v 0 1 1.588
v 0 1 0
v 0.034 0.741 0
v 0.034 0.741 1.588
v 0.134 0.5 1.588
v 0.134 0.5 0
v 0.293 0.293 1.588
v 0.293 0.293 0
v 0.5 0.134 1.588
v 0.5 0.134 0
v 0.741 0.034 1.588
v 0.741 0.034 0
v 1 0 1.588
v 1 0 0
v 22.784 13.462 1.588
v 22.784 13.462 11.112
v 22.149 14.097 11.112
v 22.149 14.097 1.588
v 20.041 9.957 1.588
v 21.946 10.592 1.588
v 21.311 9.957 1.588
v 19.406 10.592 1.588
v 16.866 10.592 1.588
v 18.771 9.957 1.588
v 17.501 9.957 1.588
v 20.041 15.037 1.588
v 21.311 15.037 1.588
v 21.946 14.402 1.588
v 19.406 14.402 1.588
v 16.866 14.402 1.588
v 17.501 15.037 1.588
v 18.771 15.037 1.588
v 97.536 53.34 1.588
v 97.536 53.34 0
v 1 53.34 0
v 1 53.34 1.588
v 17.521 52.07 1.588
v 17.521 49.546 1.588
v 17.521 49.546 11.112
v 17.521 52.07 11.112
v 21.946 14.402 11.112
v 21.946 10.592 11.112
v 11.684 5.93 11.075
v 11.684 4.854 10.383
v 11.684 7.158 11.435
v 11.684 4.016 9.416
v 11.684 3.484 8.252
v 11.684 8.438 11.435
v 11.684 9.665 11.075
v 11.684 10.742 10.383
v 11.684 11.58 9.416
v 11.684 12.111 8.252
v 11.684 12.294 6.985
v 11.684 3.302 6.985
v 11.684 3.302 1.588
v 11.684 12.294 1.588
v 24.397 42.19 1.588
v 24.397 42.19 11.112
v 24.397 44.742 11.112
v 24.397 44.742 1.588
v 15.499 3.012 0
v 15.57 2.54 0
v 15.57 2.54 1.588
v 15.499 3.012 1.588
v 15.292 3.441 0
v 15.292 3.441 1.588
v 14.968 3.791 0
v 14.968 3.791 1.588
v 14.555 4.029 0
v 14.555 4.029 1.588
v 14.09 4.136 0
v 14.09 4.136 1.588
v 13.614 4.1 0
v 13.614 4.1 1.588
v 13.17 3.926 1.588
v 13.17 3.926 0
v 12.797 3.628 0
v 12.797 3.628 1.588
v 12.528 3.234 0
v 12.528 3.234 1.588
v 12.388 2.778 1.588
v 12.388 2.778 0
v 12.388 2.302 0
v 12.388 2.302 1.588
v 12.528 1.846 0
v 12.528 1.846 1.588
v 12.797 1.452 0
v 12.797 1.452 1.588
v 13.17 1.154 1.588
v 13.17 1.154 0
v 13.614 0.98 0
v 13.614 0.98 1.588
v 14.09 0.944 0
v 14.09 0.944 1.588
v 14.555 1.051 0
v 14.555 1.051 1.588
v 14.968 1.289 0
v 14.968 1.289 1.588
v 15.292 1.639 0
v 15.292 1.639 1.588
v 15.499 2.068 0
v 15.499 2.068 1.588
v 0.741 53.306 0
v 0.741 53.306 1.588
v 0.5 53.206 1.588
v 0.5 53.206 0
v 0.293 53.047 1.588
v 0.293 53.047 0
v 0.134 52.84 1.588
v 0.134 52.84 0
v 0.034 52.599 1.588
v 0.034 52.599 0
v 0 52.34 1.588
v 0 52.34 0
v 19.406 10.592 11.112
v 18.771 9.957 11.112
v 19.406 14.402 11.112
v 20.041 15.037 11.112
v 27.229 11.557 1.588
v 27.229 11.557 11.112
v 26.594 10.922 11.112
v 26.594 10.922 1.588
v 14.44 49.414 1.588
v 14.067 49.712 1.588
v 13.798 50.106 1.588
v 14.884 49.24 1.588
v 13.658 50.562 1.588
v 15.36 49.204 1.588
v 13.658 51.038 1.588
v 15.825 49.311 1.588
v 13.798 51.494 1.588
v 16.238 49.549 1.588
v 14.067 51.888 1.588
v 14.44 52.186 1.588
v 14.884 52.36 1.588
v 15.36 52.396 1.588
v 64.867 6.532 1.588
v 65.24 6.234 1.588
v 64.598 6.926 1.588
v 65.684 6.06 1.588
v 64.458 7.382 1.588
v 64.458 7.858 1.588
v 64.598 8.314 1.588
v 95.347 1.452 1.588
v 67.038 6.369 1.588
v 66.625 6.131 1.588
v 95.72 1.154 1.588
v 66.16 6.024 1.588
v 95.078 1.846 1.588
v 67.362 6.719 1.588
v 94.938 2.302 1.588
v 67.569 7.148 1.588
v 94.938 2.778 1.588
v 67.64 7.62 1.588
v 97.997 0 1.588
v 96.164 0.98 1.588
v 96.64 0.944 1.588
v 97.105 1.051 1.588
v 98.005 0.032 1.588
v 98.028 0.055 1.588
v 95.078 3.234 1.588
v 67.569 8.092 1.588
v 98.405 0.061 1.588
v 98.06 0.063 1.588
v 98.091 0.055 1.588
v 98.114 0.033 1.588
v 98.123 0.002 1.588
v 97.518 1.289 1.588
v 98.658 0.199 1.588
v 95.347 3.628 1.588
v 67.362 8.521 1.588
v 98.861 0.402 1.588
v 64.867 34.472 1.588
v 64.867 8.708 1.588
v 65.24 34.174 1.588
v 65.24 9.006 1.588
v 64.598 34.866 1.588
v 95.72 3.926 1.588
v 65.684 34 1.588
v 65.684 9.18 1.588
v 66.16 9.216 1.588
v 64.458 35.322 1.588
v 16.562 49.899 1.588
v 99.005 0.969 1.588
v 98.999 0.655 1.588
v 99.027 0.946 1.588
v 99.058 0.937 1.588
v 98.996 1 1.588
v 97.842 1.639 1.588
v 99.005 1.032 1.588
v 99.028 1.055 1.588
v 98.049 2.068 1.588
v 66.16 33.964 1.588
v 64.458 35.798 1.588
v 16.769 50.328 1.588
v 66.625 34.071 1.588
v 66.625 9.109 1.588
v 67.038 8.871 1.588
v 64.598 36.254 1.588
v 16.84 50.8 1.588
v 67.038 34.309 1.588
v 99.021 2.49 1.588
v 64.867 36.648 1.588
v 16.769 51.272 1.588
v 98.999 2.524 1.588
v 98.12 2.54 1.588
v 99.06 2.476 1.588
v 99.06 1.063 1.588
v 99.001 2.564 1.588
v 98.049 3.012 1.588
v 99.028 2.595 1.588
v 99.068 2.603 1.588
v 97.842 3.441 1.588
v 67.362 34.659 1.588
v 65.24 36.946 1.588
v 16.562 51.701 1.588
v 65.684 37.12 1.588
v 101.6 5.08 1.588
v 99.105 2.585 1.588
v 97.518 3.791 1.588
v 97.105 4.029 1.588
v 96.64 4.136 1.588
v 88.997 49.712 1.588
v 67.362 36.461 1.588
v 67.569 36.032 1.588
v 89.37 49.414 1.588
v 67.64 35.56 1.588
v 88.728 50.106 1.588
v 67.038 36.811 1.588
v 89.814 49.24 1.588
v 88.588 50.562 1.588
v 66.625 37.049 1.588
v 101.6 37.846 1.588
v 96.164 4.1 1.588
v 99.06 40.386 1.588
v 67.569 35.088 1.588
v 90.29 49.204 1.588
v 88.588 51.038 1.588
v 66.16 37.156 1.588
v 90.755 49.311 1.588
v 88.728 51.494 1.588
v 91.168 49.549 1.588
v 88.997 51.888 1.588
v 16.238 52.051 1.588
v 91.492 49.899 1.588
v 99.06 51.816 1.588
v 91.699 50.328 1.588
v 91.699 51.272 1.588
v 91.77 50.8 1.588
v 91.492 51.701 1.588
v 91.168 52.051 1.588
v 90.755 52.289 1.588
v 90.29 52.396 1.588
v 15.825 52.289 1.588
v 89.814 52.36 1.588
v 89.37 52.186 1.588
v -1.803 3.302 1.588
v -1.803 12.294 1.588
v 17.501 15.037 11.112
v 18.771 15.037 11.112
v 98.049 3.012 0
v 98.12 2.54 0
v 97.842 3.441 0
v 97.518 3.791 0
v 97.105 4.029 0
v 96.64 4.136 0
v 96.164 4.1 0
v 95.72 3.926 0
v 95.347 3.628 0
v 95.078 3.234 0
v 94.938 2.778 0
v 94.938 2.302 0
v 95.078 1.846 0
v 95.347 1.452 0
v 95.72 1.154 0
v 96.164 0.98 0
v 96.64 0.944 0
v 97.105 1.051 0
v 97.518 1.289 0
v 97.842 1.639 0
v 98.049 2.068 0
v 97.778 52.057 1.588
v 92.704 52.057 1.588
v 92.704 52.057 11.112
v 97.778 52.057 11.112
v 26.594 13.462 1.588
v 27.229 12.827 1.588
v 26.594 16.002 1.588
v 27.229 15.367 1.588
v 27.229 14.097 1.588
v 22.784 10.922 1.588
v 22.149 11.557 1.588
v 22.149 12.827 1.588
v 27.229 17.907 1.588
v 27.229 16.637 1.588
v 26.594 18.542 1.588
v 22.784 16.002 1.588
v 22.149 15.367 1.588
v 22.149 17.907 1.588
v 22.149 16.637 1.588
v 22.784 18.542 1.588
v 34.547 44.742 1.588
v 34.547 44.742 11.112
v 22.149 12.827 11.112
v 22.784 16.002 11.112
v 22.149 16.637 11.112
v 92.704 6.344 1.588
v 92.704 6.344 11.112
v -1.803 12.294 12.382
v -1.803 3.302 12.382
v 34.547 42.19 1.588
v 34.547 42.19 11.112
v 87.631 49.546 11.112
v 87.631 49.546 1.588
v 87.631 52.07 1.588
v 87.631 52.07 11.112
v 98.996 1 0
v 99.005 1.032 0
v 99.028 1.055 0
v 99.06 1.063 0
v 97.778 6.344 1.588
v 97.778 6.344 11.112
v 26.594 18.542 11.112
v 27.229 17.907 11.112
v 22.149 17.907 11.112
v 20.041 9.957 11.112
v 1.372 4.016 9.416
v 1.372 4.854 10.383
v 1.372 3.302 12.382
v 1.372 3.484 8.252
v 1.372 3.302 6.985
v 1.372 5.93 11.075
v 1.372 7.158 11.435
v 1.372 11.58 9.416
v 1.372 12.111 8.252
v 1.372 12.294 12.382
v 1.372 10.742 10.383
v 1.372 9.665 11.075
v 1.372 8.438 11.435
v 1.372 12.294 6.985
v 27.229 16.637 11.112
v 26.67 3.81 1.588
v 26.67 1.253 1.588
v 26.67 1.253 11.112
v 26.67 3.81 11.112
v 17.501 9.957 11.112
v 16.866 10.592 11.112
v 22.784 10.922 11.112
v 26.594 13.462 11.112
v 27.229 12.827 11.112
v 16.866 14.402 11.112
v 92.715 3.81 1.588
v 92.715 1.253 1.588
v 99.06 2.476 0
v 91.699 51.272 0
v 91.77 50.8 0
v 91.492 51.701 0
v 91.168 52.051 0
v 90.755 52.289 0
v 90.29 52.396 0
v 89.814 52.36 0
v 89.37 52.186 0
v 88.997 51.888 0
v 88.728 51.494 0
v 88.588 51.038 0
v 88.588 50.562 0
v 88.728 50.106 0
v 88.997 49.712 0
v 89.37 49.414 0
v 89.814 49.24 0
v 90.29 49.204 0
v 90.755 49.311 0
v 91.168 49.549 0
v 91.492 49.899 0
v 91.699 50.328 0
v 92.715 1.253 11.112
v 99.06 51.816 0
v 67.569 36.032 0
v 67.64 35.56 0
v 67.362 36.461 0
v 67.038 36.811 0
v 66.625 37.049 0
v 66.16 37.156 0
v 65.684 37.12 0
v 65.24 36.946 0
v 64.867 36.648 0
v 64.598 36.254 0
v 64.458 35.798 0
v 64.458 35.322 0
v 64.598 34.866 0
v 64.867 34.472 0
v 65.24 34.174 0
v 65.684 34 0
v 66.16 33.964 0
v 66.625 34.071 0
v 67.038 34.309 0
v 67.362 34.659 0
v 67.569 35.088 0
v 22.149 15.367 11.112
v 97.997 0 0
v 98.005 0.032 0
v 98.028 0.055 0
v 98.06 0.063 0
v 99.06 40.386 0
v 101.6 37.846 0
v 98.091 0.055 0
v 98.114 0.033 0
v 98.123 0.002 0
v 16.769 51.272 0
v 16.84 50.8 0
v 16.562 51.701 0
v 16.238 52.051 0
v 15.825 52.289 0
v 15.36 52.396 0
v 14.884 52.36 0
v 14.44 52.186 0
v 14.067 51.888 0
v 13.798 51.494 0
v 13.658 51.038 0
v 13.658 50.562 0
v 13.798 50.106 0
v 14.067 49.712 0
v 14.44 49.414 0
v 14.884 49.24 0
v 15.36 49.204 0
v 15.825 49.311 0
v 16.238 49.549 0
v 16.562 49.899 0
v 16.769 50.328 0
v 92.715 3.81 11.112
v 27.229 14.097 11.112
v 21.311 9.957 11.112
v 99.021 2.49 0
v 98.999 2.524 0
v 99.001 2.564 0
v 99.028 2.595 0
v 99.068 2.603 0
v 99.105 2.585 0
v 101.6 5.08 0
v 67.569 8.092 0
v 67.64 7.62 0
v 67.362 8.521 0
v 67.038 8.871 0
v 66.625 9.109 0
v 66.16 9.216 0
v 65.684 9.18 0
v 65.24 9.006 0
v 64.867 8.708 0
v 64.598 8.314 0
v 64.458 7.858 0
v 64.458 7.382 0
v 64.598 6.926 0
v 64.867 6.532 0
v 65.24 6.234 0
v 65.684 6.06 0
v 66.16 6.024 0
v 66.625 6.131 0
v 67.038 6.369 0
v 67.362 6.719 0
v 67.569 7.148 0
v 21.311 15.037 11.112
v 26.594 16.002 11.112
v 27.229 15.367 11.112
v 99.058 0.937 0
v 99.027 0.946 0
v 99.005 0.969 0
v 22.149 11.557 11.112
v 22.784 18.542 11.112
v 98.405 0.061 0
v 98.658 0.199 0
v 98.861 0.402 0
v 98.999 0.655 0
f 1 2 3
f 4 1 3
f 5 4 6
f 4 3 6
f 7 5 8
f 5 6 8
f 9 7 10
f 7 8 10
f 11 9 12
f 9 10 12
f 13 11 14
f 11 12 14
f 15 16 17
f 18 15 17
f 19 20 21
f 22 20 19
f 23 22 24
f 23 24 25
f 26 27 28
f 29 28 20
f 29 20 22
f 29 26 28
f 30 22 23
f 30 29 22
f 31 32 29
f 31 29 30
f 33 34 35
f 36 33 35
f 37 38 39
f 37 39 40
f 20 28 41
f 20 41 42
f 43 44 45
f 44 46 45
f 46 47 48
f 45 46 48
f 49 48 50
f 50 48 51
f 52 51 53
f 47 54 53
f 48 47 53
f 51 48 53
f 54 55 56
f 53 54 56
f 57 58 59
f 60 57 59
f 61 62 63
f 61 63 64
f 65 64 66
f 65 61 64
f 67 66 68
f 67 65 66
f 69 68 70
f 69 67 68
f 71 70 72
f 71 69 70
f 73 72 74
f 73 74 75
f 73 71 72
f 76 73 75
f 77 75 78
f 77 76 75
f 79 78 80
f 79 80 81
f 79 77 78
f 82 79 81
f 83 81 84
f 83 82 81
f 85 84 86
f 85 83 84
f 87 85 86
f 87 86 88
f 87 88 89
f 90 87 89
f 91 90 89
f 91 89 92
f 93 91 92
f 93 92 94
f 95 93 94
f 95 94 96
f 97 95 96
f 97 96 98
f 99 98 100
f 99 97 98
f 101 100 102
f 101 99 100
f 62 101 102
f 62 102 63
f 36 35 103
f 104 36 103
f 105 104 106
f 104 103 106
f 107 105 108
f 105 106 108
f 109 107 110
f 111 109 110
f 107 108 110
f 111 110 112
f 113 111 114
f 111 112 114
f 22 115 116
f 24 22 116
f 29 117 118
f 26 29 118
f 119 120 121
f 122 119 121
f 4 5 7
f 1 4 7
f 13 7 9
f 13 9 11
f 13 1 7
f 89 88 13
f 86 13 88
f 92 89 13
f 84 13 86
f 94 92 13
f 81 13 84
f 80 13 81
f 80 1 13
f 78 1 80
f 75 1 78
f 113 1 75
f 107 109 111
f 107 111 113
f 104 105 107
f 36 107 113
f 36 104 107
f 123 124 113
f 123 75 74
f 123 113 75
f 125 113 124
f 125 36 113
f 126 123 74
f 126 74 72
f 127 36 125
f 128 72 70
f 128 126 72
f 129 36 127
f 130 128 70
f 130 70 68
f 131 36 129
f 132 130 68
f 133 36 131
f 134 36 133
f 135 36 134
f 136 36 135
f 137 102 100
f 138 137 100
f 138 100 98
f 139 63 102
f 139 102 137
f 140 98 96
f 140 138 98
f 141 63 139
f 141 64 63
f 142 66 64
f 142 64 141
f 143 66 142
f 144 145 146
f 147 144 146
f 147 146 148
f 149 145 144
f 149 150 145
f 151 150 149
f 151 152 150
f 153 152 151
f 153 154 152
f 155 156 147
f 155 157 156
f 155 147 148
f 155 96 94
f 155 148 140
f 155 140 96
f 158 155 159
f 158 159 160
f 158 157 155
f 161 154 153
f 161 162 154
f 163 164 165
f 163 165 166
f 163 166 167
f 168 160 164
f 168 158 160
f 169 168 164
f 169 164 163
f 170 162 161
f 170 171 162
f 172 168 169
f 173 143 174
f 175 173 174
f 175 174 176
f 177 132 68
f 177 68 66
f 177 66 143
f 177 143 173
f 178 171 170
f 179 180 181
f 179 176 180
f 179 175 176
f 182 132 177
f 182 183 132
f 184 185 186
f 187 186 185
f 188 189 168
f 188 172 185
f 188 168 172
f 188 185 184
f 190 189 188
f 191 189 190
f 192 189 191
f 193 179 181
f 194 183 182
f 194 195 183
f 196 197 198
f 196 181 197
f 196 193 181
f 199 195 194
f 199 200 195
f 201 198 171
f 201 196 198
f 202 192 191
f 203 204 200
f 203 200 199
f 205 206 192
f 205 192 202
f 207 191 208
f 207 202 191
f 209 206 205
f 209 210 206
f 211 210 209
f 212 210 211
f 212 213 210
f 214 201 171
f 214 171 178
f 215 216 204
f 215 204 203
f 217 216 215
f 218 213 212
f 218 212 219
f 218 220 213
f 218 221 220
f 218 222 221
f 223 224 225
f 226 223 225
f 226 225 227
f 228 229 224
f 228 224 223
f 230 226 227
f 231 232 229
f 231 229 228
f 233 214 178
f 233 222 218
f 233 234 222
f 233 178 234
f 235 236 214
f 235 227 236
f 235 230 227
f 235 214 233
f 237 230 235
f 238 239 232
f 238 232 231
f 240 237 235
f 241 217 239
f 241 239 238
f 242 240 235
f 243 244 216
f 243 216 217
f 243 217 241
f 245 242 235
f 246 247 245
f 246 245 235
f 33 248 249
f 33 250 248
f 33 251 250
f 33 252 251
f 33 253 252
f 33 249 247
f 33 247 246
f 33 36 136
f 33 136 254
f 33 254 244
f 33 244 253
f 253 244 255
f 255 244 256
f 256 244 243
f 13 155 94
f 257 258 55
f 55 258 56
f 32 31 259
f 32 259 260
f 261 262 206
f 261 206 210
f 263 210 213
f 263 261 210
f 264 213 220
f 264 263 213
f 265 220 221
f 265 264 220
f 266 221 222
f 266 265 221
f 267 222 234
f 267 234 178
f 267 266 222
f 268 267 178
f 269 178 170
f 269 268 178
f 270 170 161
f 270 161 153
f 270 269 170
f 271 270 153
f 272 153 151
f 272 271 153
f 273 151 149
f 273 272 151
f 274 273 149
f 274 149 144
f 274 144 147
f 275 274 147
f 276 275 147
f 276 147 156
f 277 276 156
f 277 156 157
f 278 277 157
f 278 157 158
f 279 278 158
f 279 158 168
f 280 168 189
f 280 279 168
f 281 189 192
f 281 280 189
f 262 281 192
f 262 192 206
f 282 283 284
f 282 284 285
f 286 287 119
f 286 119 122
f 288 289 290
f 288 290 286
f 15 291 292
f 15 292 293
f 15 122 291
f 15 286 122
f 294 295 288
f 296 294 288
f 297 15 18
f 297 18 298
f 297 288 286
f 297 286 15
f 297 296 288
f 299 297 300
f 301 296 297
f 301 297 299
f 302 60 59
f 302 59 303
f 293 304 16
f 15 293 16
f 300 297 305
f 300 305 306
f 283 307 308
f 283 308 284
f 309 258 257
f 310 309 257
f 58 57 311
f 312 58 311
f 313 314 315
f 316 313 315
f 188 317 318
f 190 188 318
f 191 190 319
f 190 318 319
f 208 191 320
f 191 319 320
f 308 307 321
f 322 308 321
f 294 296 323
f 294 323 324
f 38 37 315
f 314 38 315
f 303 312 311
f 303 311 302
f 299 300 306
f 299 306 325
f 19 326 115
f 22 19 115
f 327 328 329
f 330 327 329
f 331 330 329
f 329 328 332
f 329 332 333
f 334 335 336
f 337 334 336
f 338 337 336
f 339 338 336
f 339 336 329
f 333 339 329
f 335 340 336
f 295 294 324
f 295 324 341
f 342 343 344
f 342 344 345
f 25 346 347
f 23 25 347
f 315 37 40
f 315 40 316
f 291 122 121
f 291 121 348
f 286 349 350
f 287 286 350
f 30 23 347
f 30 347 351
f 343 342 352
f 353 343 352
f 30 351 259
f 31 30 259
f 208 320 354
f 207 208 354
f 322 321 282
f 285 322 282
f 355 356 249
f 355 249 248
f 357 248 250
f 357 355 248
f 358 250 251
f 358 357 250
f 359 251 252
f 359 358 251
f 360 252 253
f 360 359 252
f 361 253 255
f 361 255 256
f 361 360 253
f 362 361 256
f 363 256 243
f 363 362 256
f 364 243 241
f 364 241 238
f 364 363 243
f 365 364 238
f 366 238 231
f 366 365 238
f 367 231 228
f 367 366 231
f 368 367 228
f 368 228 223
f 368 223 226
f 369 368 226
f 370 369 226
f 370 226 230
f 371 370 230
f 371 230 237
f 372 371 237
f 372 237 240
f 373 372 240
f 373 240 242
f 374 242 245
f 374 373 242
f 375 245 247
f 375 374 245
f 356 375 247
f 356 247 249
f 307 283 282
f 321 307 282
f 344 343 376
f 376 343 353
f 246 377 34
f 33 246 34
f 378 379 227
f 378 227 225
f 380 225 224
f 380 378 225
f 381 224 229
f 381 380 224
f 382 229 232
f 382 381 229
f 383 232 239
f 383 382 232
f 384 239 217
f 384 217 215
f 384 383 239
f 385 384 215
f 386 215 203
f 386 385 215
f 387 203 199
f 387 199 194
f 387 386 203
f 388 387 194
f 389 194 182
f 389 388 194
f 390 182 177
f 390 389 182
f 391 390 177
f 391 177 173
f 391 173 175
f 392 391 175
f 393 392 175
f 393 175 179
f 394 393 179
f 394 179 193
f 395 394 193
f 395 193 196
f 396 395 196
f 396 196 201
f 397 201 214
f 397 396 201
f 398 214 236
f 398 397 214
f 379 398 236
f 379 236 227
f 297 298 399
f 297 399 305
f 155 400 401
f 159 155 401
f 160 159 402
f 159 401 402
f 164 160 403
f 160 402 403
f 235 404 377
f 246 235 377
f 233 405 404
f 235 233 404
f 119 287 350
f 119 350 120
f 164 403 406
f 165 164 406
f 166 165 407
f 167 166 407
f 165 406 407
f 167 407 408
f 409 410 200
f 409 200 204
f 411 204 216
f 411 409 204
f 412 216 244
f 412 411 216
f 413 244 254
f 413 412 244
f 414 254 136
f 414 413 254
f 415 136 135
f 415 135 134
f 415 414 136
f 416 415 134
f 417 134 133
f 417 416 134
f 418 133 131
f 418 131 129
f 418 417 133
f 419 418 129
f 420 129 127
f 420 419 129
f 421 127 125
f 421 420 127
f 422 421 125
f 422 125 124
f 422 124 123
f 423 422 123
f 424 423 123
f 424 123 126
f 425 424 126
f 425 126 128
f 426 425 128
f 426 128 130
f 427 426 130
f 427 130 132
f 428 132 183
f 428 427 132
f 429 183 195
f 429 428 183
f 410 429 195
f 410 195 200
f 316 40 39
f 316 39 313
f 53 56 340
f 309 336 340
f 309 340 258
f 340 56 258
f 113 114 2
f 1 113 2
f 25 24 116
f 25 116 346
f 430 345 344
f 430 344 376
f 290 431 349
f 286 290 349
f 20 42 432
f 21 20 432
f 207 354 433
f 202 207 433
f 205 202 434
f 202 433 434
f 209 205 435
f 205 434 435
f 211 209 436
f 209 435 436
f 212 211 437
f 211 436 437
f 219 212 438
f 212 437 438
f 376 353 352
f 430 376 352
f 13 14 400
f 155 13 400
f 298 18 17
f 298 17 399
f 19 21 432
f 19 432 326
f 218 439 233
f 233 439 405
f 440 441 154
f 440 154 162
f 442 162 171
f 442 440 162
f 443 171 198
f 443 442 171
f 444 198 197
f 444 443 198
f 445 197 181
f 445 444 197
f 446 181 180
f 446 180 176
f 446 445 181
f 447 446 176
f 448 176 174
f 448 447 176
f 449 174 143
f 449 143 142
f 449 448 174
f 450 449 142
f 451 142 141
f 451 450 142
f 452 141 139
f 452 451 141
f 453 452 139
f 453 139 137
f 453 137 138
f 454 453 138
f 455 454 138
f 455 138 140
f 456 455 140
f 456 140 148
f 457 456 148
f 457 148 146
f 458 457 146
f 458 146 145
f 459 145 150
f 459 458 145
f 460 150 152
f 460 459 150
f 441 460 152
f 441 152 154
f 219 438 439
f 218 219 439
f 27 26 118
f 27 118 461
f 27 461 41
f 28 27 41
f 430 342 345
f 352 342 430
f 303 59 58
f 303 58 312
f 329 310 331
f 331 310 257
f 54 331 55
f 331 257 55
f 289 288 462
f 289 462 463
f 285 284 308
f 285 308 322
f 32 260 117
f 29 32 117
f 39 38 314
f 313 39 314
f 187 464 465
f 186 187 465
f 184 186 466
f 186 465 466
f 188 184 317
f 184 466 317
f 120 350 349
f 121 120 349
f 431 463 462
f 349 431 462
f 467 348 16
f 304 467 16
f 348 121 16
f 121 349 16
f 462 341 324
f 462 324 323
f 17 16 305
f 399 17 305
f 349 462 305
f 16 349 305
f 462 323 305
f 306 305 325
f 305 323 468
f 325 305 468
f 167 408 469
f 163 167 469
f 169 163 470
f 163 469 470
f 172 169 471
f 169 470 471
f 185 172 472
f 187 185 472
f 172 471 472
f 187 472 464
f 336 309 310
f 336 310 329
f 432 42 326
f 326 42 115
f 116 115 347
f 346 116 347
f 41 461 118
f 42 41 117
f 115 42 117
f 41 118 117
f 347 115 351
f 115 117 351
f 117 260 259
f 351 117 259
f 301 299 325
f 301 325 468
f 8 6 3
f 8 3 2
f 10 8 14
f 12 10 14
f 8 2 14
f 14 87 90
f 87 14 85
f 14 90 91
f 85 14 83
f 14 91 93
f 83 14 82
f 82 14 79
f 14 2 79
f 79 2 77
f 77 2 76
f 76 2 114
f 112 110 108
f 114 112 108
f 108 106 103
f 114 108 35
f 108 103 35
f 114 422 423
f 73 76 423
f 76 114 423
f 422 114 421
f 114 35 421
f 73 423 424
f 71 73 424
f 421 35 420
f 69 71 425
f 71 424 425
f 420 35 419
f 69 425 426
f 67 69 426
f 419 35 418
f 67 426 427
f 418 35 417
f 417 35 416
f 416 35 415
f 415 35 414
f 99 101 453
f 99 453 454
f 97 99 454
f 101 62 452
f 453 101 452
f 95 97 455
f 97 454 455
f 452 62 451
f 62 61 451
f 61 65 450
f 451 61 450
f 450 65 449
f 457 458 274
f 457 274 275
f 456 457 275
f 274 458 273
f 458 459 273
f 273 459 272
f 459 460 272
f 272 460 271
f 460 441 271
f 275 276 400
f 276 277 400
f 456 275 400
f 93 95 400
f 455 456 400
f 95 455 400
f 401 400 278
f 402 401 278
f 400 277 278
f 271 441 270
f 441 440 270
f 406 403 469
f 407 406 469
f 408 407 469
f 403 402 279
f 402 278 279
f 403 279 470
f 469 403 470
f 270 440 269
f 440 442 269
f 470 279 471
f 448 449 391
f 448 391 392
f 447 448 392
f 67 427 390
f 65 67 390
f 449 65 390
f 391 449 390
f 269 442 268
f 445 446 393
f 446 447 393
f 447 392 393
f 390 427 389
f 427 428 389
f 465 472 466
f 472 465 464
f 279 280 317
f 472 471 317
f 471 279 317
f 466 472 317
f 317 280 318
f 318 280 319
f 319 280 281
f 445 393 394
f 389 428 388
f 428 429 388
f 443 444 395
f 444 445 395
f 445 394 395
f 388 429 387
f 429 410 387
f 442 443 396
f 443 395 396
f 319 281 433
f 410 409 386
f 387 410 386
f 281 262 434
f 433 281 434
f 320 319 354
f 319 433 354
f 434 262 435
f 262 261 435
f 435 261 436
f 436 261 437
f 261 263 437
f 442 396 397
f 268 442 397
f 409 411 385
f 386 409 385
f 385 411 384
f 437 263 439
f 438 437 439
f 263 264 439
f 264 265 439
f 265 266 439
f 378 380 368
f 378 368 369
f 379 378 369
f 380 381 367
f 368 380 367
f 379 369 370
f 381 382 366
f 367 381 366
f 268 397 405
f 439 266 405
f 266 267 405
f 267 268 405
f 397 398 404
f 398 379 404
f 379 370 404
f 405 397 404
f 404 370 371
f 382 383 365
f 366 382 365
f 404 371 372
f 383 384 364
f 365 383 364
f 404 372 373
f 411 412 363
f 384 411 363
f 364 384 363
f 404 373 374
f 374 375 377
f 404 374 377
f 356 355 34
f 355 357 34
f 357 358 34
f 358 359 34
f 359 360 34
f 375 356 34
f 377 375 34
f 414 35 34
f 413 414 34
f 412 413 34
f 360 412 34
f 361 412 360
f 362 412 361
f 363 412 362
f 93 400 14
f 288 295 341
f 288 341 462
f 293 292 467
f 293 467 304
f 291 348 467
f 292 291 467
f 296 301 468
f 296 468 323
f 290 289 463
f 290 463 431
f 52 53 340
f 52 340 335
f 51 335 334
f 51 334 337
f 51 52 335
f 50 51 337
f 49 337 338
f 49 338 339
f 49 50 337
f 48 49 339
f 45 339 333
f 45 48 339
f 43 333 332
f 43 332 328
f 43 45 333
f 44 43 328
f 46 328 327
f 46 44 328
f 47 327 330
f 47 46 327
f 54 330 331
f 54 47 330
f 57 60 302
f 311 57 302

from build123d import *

# Parameters (mm, degrees)
SKETCH_20_R           = 1.5999968
BOSS_EXTRUDE1_DEPTH   = 1.5875
BOSS_EXTRUDE3_START   = 1.5875
SKETCH_21_W           = 5.073903667
SKETCH_21_H           = 45.712510943
BOSS_EXTRUDE3_DEPTH   = 9.525
BOSS_EXTRUDE3_2_DEPTH = 9.525
BOSS_EXTRUDE3_3_DEPTH = 9.525
SKETCH_21_W_2         = 10.150310815
SKETCH_21_H_2         = 2.551495436
BOSS_EXTRUDE3_4_DEPTH = 9.525
SKETCH_21_W_3         = 70.109338124
SKETCH_21_H_3         = 2.523533961
BOSS_EXTRUDE3_5_DEPTH = 9.525
SKETCH_21_W_4         = 66.044705072
SKETCH_21_H_4         = 2.556578821
BOSS_EXTRUDE3_6_DEPTH = 9.525
BOSS_EXTRUDE6_START   = 1.5875
BOSS_EXTRUDE6_DEPTH   = 10.795
CUT_EXTRUDE4_DEPTH    = 10.3124


with BuildPart() as part:
    # 20 → Boss-Extrude1 (new body)
    with BuildSketch(Plane.XY):
        with BuildLine():
            Line((99.06, 51.816), (97.536, 53.34))
            Line((97.536, 53.34), (0.999998, 53.34))
            ThreePointArc((0.999998, 53.34), (0.292892414, 53.047107586), (0, 52.340002))
            Line((0, 52.340002), (0, 0.999998))
            ThreePointArc((0, 0.999998), (0.292892414, 0.292892414), (0.999998, 0))
            Line((0.999998, 0), (97.996502, 0))
            ThreePointArc((97.996502, 0), (98.015100719, 0.044901281), (98.060002, 0.0635))
            ThreePointArc((98.060002, 0.0635), (98.104184738, 0.045608504), (98.123469987, 0.002016083))
            ThreePointArc((98.123469987, 0.002016083), (98.767107586, 0.292892414), (99.057983917, 0.936530013))
            ThreePointArc((99.057983917, 0.936530013), (99.014391496, 0.955815262), (98.9965, 0.999998))
            ThreePointArc((98.9965, 0.999998), (99.015098719, 1.044899281), (99.06, 1.063498))
            Line((99.06, 1.063498), (99.06, 2.476491629))
            ThreePointArc((99.06, 2.476491629), (99.001325916, 2.564303602), (99.1049072, 2.5849072))
            Line((99.1049072, 2.5849072), (101.555098719, 5.035098719))
            Line((101.555098719, 5.035098719), (101.6, 5.08))
            Line((101.6, 5.08), (101.6, 5.1435))
            Line((101.6, 5.1435), (101.6, 37.846))
            Line((101.6, 37.846), (99.06, 40.386))
            Line((99.06, 40.386), (99.06, 51.816))
        make_face()
        with Locations((13.97, 2.54)):
            Circle(SKETCH_20_R, mode=Mode.SUBTRACT)
        with Locations((66.04, 7.62)):
            Circle(SKETCH_20_R, mode=Mode.SUBTRACT)
        with Locations((96.52, 2.54)):
            Circle(SKETCH_20_R, mode=Mode.SUBTRACT)
        with Locations((15.24, 50.8)):
            Circle(SKETCH_20_R, mode=Mode.SUBTRACT)
        with Locations((66.04, 35.56)):
            Circle(SKETCH_20_R, mode=Mode.SUBTRACT)
        with Locations((90.17, 50.8)):
            Circle(SKETCH_20_R, mode=Mode.SUBTRACT)
    extrude(amount=BOSS_EXTRUDE1_DEPTH)


with BuildPart() as body_2:
    # 21 → Boss-Extrude3 (new body)
    with BuildSketch(Plane.XY.offset(BOSS_EXTRUDE3_START)):
        with Locations((95.241145717, 29.200449355)):
            Rectangle(SKETCH_21_W, SKETCH_21_H)
    extrude(amount=BOSS_EXTRUDE3_DEPTH)


with BuildPart() as body_3:
    # 21 → Boss-Extrude3 2 (new body)
    with BuildSketch(Plane.XY.offset(BOSS_EXTRUDE3_START)):
        Polygon((22.7838, 10.922), (22.1488, 11.557), (22.1488, 12.827), (22.7838, 13.462), (22.1488, 14.097), (22.1488, 15.367), (22.7838, 16.002), (22.1488, 16.637), (22.1488, 17.907), (22.7838, 18.542), (26.5938, 18.542), (27.2288, 17.907), (27.2288, 16.637), (26.5938, 16.002), (27.2288, 15.367), (27.2288, 14.097), (26.5938, 13.462), (27.2288, 12.827), (27.2288, 11.557), (26.5938, 10.922), align=None)
    extrude(amount=BOSS_EXTRUDE3_2_DEPTH)


with BuildPart() as body_4:
    # 21 → Boss-Extrude3 3 (new body)
    with BuildSketch(Plane.XY.offset(BOSS_EXTRUDE3_START)):
        Polygon((20.0406, 9.9568), (19.4056, 10.5918), (18.7706, 9.9568), (17.5006, 9.9568), (16.8656, 10.5918), (16.8656, 14.4018), (17.5006, 15.0368), (18.7706, 15.0368), (19.4056, 14.4018), (20.0406, 15.0368), (21.3106, 15.0368), (21.9456, 14.4018), (21.9456, 10.5918), (21.3106, 9.9568), align=None)
    extrude(amount=BOSS_EXTRUDE3_3_DEPTH)


with BuildPart() as body_5:
    # 21 → Boss-Extrude3 4 (new body)
    with BuildSketch(Plane.XY.offset(BOSS_EXTRUDE3_START)):
        with Locations((29.472154972, 43.466052718)):
            Rectangle(SKETCH_21_W_2, SKETCH_21_H_2)
    extrude(amount=BOSS_EXTRUDE3_4_DEPTH)


with BuildPart() as body_6:
    # 21 → Boss-Extrude3 5 (new body)
    with BuildSketch(Plane.XY.offset(BOSS_EXTRUDE3_START)):
        with Locations((52.575938469, 50.80823302)):
            Rectangle(SKETCH_21_W_3, SKETCH_21_H_3)
    extrude(amount=BOSS_EXTRUDE3_5_DEPTH)


with BuildPart() as body_7:
    # 21 → Boss-Extrude3 6 (new body)
    with BuildSketch(Plane.XY.offset(BOSS_EXTRUDE3_START)):
        with Locations((59.692352536, 2.53171059)):
            Rectangle(SKETCH_21_W_4, SKETCH_21_H_4)
    extrude(amount=BOSS_EXTRUDE3_6_DEPTH)


with BuildPart() as body_8:
    # 21<6> → Boss-Extrude6 (new body)
    with BuildSketch(Plane.XY.offset(BOSS_EXTRUDE6_START)):
        Polygon((-1.8034, 12.2936), (-1.8034, 3.302), (5.969, 3.302), (11.3665, 3.302), (11.684, 3.302), (11.684, 5.5245), (11.684, 10.922), (11.684, 12.2936), (1.6764, 12.2936), align=None)
    extrude(amount=BOSS_EXTRUDE6_DEPTH)

    # Sketch4 → Cut-Extrude4 (cut)
    with BuildSketch(Plane(origin=(11.684, 0, 0), x_dir=(0, 0, -1), z_dir=(1, 0, 0))):
        with BuildLine():
            Line((-6.985, 3.302), (-21.694212729, 3.302))
            Line((-21.694212729, 3.302), (-21.694212729, 12.2936))
            Line((-21.694212729, 12.2936), (-6.985, 12.2936))
            ThreePointArc((-6.985, 12.2936), (-11.4808, 7.7978), (-6.985, 3.302))
        make_face()
    extrude(amount=-CUT_EXTRUDE4_DEPTH, mode=Mode.SUBTRACT)


solid = Compound([part.part, body_2.part, body_3.part, body_4.part, body_5.part, body_6.part, body_7.part, body_8.part])
